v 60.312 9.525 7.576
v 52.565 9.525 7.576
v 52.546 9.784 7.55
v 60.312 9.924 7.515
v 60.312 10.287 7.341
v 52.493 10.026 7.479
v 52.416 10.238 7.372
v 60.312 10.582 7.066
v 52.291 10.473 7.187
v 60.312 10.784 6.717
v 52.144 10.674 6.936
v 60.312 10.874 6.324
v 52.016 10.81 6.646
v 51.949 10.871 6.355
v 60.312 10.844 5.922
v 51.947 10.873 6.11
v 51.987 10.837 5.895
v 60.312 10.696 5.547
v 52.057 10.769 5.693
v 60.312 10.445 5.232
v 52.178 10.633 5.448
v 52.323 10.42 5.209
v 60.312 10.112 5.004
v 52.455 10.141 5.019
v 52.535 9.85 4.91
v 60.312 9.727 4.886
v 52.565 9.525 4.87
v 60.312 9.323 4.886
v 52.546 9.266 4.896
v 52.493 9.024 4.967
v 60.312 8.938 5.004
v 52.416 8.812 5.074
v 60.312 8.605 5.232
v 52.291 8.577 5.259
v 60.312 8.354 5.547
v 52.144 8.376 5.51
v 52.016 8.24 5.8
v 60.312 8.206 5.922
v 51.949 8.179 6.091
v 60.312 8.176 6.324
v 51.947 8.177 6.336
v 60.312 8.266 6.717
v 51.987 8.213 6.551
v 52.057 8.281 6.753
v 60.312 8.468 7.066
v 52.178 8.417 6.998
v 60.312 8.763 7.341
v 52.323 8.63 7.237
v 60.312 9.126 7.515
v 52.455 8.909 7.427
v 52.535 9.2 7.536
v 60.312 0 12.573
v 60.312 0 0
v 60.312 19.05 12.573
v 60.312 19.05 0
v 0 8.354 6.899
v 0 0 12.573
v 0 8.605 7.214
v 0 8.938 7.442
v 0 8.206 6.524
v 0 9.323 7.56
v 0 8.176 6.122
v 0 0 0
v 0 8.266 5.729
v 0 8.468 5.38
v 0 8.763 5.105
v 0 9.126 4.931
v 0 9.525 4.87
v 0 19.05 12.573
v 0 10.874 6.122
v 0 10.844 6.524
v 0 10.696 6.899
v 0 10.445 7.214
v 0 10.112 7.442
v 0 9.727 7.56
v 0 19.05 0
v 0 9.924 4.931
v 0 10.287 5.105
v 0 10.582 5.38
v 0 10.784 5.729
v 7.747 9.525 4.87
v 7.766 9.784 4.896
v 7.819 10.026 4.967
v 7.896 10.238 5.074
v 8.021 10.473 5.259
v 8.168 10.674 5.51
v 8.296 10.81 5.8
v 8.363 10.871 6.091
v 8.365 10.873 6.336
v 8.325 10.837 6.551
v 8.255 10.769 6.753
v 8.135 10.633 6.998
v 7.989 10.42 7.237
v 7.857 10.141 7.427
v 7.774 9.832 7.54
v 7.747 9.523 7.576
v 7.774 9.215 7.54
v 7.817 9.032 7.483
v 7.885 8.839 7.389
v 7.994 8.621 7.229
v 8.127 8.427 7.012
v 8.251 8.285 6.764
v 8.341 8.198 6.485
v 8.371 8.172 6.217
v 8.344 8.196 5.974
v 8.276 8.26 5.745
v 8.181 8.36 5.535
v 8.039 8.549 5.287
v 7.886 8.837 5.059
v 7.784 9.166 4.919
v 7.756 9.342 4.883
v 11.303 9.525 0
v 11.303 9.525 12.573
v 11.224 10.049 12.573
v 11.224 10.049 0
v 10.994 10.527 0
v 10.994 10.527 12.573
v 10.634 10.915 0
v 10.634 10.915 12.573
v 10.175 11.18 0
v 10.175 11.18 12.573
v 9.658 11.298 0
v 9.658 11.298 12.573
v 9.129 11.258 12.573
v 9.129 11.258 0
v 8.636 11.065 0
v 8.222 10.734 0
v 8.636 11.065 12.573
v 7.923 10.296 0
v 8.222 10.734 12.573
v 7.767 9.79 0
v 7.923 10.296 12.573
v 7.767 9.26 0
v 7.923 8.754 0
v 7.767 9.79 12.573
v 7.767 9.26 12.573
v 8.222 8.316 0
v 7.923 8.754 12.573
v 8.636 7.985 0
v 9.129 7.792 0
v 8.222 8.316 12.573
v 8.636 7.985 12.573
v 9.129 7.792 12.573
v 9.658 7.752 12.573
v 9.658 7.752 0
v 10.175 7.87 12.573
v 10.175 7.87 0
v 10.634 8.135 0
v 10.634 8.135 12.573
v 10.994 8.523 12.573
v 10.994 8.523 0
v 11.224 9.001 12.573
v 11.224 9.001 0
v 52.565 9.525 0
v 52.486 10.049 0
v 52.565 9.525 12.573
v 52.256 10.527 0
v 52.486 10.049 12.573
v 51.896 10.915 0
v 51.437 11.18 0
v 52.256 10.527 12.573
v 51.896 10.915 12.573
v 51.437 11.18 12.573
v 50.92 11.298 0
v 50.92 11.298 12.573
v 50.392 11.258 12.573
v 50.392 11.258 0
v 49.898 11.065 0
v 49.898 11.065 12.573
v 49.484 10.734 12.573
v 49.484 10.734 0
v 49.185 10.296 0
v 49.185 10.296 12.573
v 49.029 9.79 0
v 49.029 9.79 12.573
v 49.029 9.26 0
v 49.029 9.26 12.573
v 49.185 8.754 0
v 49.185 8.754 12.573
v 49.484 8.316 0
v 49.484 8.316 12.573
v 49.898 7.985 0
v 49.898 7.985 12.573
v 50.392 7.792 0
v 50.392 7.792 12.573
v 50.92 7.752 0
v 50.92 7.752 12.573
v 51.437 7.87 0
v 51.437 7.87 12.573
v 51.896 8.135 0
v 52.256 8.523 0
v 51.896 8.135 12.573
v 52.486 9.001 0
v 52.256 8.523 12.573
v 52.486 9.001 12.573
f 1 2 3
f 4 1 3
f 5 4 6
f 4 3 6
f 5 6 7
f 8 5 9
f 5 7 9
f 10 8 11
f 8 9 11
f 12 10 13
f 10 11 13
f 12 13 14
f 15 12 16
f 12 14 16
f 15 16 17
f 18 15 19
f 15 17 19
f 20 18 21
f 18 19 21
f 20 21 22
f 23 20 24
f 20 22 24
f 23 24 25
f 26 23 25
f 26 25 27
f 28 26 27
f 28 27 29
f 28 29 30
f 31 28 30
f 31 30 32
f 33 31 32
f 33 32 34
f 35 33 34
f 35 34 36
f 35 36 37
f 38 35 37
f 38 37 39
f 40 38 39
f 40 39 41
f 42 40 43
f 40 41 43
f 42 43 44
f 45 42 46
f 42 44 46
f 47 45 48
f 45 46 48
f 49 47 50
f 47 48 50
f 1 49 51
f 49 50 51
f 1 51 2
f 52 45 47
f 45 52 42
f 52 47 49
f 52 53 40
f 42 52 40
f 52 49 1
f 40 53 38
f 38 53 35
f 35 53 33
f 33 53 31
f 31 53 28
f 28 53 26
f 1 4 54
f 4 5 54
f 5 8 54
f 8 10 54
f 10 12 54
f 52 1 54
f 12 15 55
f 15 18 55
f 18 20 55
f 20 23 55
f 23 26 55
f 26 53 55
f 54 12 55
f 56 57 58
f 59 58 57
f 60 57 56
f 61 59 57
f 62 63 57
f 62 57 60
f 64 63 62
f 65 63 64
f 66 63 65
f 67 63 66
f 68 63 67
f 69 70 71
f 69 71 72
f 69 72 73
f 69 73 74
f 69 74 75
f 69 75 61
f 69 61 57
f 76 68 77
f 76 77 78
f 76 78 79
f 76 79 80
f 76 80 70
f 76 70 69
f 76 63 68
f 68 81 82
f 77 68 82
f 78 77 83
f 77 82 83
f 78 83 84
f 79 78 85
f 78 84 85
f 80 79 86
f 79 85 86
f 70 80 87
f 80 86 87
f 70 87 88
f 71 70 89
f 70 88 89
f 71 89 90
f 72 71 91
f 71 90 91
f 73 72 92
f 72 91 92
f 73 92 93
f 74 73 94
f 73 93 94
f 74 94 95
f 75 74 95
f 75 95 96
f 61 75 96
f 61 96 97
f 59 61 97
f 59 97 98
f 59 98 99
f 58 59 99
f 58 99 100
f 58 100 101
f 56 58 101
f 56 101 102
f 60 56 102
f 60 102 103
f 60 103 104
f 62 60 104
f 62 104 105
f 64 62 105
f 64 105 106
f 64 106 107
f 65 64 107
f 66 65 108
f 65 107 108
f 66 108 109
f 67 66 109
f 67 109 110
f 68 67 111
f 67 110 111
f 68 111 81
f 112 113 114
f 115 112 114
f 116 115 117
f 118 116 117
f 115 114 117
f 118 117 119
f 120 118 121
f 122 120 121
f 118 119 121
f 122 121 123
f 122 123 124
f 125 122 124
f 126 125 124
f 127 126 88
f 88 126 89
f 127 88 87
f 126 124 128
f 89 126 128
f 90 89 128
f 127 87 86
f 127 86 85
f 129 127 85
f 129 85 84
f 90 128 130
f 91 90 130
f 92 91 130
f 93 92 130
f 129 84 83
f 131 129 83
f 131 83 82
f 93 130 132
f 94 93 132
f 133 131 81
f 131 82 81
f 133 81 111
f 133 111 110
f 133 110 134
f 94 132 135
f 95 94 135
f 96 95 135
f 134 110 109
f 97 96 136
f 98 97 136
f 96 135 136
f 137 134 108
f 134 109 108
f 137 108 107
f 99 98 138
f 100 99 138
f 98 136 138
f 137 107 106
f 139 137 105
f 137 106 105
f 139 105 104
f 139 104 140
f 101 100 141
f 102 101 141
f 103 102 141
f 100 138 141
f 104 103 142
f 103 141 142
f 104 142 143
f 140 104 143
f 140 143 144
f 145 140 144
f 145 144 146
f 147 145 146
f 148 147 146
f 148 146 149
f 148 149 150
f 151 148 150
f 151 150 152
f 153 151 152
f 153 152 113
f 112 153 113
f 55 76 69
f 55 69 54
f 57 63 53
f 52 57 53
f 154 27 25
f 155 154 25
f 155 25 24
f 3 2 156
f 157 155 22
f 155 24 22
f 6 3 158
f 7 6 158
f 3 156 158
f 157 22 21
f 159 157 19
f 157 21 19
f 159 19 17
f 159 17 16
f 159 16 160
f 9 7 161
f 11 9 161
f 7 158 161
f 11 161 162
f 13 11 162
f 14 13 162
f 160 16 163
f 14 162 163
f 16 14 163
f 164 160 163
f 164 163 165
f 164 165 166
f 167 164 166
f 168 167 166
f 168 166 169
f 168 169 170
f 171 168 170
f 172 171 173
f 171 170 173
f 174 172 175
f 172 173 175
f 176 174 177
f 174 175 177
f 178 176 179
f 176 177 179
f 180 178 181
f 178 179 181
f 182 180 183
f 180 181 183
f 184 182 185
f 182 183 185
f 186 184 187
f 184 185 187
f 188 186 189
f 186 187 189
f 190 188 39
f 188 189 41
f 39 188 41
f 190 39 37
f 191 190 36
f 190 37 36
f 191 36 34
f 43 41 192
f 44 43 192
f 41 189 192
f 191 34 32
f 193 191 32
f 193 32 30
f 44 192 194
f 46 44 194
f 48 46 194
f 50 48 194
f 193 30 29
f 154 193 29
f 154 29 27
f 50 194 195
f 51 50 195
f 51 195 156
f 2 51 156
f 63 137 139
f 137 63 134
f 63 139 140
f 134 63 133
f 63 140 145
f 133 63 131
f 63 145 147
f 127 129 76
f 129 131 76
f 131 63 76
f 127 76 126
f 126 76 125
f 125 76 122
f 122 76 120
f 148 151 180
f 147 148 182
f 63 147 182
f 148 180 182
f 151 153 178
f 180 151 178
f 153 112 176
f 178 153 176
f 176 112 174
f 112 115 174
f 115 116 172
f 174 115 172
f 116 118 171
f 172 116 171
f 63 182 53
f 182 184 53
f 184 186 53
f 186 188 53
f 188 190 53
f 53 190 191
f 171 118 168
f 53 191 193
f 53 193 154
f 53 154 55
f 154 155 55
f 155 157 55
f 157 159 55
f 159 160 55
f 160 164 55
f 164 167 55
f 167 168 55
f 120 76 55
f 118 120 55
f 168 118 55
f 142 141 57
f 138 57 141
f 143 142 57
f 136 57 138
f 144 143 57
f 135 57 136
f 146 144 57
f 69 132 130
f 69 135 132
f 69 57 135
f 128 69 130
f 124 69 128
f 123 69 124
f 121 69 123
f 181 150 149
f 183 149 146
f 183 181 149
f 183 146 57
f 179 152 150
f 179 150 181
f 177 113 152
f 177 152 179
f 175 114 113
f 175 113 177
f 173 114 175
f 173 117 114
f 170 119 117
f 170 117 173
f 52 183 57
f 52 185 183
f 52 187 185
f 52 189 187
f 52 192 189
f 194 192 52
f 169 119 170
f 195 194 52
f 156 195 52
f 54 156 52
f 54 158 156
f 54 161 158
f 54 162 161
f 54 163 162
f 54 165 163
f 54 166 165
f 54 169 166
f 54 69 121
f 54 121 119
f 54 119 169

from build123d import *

# Parameters (mm, degrees)
SKETCH1_W                 = 60.3123
SKETCH1_H                 = 19.05
EXTRUDE1_DEPTH            = 12.573
SKETCH2_R                 = 1.778
CUT_EXTRUDE1_DEPTH        = 13.573
F_6_32_TAPPED_HOLE1_D     = 2.7051
F_6_32_TAPPED_HOLE1_DEPTH = 9.525
F_6_32_TAPPED_HOLE1_TIP   = 0.81269403
F_6_32_TAPPED_HOLE2_D     = 2.7051
F_6_32_TAPPED_HOLE2_DEPTH = 9.525
F_6_32_TAPPED_HOLE2_TIP   = 0.81269403


with BuildPart() as part:
    # Sketch1 → Extrude1 (new body)
    with BuildSketch(Plane.XY):
        with Locations((30.15615, 9.525)):
            Rectangle(SKETCH1_W, SKETCH1_H)
    extrude(amount=EXTRUDE1_DEPTH)

    # Sketch2 → Cut-Extrude1 (cut, through all)
    with BuildSketch(Plane.XY.offset(12.573)):
        with Locations((9.525, 9.525)):
            Circle(SKETCH2_R)
        with Locations((50.7873, 9.525)):
            Circle(SKETCH2_R)
    extrude(amount=-CUT_EXTRUDE1_DEPTH, mode=Mode.SUBTRACT)

    # #6-32 Tapped Hole1
    with Locations(Plane.ZY):
        with Locations((6.223, 9.525)):
            Hole(F_6_32_TAPPED_HOLE1_D / 2, depth=F_6_32_TAPPED_HOLE1_DEPTH)
            with Locations((0, 0, -(F_6_32_TAPPED_HOLE1_DEPTH + F_6_32_TAPPED_HOLE1_TIP / 2))):  # 118° drill point
                Cone(0, F_6_32_TAPPED_HOLE1_D / 2, F_6_32_TAPPED_HOLE1_TIP, mode=Mode.SUBTRACT)

    # #6-32 Tapped Hole2
    with Locations(Plane(origin=(60.3123, 0, 0), x_dir=(0, 0, -1), z_dir=(1, 0, 0))):
        with Locations((-6.223, 9.525)):
            Hole(F_6_32_TAPPED_HOLE2_D / 2, depth=F_6_32_TAPPED_HOLE2_DEPTH)
            with Locations((0, 0, -(F_6_32_TAPPED_HOLE2_DEPTH + F_6_32_TAPPED_HOLE2_TIP / 2))):  # 118° drill point
                Cone(0, F_6_32_TAPPED_HOLE2_D / 2, F_6_32_TAPPED_HOLE2_TIP, mode=Mode.SUBTRACT)


solid = part.part
